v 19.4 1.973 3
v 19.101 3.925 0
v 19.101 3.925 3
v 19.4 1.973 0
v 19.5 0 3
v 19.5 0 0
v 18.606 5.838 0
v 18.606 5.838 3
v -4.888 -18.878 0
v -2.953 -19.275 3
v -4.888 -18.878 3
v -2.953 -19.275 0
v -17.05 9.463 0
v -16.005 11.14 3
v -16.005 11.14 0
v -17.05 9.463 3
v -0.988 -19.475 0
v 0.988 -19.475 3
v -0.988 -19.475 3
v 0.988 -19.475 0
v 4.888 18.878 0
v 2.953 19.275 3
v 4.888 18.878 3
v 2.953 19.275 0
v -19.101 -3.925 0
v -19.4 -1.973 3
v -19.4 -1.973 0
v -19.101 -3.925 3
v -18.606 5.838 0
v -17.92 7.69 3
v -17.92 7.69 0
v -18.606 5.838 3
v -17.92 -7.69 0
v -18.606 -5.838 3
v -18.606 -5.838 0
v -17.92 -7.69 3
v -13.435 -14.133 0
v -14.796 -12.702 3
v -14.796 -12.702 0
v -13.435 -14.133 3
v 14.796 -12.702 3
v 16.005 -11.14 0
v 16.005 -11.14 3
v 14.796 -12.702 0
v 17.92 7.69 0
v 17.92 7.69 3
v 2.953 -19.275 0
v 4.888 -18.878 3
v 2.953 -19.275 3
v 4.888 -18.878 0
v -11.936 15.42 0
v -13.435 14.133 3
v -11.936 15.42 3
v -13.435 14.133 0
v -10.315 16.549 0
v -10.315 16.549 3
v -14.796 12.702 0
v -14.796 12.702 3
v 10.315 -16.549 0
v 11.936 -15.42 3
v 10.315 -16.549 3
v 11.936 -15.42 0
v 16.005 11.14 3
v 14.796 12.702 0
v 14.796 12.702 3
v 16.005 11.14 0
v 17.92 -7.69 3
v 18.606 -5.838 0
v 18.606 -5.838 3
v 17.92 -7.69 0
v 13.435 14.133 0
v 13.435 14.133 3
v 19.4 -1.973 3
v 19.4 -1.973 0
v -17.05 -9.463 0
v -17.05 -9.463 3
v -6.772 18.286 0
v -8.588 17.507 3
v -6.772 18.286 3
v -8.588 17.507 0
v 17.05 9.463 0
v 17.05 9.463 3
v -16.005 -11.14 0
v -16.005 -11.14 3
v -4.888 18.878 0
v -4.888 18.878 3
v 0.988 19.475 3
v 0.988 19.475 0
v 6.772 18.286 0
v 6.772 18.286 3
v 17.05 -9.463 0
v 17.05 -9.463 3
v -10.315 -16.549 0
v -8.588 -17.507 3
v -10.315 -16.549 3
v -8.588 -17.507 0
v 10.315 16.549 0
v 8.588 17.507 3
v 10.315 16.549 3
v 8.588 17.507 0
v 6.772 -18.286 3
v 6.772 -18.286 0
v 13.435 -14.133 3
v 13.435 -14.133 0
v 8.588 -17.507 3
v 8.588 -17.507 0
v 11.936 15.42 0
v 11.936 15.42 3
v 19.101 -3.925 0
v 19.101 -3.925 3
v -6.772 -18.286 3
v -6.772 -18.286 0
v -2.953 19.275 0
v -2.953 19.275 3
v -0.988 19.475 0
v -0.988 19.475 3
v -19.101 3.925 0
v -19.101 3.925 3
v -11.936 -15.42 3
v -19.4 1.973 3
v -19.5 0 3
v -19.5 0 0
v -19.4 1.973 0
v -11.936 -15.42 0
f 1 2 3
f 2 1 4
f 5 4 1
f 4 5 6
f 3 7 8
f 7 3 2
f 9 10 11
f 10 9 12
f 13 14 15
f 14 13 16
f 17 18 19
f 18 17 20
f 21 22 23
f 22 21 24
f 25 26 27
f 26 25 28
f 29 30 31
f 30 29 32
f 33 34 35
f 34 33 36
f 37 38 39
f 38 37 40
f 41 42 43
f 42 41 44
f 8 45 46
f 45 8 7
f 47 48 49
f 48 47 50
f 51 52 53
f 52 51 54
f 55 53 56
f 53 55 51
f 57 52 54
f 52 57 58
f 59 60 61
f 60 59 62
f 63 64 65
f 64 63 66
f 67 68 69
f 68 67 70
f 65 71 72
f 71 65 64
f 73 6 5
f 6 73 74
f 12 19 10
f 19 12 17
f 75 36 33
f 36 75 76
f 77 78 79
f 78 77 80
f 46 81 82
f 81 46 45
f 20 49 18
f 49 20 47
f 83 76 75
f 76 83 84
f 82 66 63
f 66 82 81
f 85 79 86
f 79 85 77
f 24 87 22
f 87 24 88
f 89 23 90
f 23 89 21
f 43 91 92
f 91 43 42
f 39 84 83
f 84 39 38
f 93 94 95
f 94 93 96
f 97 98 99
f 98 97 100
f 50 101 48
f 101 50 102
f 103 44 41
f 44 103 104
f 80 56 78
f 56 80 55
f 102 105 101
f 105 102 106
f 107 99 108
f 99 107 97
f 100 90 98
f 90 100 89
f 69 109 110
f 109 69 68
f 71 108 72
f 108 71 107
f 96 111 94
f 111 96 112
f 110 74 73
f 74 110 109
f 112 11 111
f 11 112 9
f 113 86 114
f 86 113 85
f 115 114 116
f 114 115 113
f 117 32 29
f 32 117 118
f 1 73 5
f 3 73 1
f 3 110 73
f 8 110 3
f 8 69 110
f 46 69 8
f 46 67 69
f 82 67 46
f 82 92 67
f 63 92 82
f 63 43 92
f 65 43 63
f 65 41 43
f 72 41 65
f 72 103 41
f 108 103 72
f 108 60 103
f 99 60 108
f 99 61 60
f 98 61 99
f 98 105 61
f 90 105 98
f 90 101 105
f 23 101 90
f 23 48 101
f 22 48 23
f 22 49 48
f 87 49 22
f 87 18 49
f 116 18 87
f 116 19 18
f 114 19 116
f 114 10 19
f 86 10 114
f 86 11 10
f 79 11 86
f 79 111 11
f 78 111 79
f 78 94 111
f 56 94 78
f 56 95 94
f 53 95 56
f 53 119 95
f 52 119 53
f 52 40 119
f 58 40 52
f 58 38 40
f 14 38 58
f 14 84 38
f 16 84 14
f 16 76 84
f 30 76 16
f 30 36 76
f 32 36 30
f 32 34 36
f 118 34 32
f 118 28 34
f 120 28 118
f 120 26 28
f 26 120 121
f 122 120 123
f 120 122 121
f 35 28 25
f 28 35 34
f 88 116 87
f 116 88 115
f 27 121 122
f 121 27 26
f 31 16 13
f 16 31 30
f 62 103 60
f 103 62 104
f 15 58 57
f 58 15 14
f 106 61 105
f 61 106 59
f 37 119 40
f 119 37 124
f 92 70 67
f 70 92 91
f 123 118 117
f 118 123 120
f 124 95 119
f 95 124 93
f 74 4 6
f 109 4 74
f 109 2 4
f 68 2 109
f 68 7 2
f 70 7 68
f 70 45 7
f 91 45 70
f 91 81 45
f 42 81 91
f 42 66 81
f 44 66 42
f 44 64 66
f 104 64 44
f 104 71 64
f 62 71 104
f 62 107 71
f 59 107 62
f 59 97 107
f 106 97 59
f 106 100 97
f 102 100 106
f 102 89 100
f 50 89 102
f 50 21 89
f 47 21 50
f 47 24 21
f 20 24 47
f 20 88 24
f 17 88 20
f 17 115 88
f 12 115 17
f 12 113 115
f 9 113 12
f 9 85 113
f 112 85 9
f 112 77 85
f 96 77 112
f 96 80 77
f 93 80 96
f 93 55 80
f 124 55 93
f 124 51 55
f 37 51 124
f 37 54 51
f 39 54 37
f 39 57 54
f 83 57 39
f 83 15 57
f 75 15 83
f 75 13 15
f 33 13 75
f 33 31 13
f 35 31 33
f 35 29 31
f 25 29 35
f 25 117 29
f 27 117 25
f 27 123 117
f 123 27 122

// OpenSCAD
//
//	Sloth Chip
//	version 1.0
//
//	created by
//	Theron Trowbridge
//	http://therontrowbridge.com
//
//	Created: 2012-12-17
//	Modified: 2012-12-18
//

//	Uses file "noun_project_656.dxf"
//	Converted from original SVG file
//	Sloth icon from The Noun Project
//	http://thenounproject.com/noun/sloth/#icon-No656
//	Designed by Gabriel Gomez
//	Public Domain

file_name="noun_project_656.dxf";
extrusion_height = 2;
logo_scale_factor = 1;
logo_width = 35;
logo_height = 28;

token_diameter = 39;
token_thickness = 3;

difference() {
	cylinder( r=(token_diameter*0.5), h=token_thickness, $fa=1 );
	translate( v=[ -(logo_width/2), -(logo_height/2), 1.5] ) {
		scale( v=[logo_scale_factor,logo_scale_factor,0.0] ) {
			linear_extrude( file=file_name, height=extrusion_height, center=false );
		}
	}
}
